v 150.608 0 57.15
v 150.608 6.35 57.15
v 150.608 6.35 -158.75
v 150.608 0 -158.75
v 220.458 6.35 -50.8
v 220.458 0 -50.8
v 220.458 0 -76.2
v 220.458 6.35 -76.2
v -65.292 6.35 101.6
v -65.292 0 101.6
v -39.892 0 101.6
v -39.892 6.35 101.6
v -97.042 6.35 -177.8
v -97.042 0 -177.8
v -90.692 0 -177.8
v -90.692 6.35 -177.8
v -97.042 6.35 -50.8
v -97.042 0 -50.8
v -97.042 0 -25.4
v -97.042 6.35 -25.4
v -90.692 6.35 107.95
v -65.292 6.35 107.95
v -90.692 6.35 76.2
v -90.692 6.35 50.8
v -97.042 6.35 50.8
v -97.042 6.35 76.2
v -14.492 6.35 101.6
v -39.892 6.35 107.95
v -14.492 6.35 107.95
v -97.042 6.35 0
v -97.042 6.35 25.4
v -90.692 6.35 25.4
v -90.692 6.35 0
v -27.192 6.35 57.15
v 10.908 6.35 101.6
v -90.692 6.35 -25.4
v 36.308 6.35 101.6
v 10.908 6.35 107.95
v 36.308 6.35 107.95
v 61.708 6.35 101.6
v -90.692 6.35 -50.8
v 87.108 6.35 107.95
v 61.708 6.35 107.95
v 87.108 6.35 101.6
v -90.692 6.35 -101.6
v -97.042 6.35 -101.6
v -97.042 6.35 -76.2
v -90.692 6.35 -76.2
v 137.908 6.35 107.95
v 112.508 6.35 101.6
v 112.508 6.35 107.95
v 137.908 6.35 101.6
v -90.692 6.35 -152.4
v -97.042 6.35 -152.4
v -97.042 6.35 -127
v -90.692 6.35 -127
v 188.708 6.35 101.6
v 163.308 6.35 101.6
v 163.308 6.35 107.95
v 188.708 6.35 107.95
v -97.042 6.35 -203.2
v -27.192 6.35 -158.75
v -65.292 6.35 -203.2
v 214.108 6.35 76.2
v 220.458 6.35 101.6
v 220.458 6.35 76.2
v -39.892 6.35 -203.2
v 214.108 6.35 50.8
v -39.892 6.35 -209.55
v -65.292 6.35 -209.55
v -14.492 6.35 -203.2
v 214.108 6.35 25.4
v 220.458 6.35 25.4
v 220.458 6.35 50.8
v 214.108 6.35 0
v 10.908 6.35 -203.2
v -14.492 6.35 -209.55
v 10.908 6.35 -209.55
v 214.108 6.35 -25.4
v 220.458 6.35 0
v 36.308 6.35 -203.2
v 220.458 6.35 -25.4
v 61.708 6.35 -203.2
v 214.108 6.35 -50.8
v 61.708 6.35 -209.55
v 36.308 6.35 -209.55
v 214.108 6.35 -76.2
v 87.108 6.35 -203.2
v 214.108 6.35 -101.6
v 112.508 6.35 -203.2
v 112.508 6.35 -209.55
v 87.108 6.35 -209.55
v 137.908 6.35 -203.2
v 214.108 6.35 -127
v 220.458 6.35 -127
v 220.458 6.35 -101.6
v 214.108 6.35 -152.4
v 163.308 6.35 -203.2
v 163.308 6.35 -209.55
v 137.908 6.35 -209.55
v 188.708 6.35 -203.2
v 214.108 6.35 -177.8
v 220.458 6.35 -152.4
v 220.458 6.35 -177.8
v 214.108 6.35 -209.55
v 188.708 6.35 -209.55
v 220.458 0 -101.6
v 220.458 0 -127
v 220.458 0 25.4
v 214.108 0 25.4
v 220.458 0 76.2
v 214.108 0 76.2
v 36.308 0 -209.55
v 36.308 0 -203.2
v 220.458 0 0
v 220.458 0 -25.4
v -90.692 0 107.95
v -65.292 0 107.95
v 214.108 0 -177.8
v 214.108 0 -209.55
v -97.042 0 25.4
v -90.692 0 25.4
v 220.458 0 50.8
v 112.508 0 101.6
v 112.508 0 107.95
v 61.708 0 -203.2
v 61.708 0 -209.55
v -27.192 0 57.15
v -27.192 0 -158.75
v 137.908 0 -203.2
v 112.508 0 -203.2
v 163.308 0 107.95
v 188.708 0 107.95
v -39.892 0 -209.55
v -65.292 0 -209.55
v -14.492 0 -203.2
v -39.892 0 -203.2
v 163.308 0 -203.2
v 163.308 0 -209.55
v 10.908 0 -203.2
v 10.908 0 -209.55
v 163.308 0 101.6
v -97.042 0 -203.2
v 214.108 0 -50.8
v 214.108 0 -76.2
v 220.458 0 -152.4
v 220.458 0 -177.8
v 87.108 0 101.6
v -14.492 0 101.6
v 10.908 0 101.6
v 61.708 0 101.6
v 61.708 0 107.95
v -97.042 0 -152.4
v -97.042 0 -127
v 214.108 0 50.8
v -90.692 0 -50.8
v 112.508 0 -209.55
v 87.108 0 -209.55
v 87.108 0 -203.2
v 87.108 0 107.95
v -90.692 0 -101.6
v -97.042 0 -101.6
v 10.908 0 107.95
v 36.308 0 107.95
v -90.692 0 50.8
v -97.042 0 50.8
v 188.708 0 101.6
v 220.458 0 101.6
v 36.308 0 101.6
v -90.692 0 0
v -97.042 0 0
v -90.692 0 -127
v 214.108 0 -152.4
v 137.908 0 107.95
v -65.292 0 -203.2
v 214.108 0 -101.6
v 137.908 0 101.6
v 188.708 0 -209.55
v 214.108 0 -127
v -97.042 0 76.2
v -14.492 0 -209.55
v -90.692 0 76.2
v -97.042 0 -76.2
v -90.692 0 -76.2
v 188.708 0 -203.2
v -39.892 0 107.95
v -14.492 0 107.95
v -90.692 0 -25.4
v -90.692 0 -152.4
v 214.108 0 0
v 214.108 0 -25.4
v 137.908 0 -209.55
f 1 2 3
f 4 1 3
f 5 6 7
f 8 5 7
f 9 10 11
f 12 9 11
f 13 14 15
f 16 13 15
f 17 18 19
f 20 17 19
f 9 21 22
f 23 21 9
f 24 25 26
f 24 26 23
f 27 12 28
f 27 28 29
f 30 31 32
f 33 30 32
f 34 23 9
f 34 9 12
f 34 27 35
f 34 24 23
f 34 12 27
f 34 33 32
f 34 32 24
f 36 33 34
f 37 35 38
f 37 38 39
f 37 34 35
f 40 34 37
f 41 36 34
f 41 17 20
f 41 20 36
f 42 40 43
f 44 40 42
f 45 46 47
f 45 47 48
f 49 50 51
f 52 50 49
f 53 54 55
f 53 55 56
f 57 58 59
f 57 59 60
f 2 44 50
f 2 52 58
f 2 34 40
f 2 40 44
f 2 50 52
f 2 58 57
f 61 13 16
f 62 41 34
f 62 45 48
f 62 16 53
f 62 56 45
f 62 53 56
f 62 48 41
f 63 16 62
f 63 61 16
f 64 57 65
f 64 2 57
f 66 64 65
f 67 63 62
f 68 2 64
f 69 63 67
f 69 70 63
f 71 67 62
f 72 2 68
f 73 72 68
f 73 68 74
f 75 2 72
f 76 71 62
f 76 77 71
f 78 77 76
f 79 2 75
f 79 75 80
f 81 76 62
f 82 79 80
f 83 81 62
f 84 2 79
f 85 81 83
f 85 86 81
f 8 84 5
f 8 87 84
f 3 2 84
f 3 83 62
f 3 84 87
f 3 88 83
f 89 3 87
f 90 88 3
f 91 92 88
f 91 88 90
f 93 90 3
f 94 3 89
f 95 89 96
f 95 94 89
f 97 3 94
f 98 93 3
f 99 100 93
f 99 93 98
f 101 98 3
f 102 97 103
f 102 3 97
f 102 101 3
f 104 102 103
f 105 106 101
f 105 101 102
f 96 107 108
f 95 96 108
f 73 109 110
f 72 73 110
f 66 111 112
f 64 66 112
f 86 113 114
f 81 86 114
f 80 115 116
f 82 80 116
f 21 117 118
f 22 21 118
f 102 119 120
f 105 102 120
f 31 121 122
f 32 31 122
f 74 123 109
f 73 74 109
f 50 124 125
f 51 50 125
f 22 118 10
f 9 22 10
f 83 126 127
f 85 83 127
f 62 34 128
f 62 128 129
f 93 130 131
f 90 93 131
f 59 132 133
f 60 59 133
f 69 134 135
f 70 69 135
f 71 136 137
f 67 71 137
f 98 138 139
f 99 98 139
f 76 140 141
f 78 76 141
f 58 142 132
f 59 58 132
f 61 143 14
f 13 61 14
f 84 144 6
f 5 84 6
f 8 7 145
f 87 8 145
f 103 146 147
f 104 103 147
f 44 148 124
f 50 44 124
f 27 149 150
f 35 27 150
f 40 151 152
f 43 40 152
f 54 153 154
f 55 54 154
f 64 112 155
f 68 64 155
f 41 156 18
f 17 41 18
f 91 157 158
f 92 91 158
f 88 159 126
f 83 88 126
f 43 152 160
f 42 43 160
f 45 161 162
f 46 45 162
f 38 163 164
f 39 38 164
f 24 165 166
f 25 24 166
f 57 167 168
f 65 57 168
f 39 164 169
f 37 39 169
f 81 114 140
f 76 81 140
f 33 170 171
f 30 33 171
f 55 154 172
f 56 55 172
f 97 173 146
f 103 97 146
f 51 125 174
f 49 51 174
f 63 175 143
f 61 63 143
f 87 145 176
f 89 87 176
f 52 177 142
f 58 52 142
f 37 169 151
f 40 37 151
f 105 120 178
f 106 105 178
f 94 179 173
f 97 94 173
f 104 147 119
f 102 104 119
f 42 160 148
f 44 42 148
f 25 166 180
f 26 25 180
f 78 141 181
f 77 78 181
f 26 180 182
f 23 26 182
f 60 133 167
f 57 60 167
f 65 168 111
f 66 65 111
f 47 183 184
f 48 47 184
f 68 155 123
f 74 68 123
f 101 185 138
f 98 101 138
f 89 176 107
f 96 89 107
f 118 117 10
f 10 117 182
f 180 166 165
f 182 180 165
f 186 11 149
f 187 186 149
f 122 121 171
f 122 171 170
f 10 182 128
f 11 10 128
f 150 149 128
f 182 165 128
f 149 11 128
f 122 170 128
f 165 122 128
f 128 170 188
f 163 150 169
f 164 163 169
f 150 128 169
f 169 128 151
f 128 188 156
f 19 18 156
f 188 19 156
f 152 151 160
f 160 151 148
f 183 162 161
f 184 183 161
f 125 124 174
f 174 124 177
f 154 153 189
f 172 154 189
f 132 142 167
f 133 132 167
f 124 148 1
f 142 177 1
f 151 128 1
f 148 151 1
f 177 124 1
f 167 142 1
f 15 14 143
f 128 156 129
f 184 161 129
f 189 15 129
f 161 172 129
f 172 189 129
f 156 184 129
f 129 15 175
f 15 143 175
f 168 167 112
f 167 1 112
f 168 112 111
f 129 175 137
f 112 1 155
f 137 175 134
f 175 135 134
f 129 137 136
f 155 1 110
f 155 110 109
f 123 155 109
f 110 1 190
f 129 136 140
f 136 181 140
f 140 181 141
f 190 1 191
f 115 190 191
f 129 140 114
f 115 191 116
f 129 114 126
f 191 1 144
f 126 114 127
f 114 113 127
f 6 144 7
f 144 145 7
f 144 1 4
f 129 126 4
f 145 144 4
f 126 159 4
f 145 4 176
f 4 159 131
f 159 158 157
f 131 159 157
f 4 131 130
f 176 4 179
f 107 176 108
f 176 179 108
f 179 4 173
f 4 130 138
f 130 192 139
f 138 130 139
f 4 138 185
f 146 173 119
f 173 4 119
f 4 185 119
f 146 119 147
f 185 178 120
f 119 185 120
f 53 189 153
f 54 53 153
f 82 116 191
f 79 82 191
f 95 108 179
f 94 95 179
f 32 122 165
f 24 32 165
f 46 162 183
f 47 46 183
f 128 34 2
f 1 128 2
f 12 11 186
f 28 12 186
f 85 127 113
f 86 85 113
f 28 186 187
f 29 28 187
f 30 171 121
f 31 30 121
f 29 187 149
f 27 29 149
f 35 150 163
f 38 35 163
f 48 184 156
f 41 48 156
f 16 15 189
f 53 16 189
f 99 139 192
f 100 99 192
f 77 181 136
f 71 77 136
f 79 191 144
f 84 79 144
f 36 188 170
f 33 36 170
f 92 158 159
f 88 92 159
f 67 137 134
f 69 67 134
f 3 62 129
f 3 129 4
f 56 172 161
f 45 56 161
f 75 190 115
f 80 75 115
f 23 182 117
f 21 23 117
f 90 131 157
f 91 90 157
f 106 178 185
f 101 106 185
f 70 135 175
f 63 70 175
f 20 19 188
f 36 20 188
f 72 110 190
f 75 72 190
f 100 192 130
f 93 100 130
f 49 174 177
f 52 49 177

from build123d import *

# Parameters (mm, degrees)
BOSS_EXTRUDE1_DEPTH = 6.35
SKETCH2_W           = 177.8
SKETCH2_H           = 215.9
CUT_EXTRUDE2_DEPTH  = 6.35


with BuildPart() as part:
    # Sketch1 → Boss-Extrude1 (new body)
    with BuildSketch(Plane(origin=(0, 0, 0), x_dir=(1, 0, 0), z_dir=(0, 1, 0))):
        Polygon((-65.292450766, -101.6), (-39.892450766, -101.6), (-39.892450766, -107.95), (-14.492450766, -107.95), (-14.492450766, -101.6), (10.907549234, -101.6), (10.907549234, -107.95), (36.307549234, -107.95), (36.307549234, -101.6), (61.707549234, -101.6), (61.707549234, -107.95), (87.107549234, -107.95), (87.107549234, -101.6), (112.507549234, -101.6), (112.507549234, -107.95), (137.907549234, -107.95), (137.907549234, -101.6), (163.307549234, -101.6), (163.307549234, -107.95), (188.707549234, -107.95), (188.707549234, -101.6), (220.457549234, -101.6), (220.457549234, -76.2), (214.107549234, -76.2), (214.107549234, -50.8), (220.457549234, -50.8), (220.457549234, -25.4), (214.107549234, -25.4), (214.107549234, 0), (220.457549234, 0), (220.457549234, 25.4), (214.107549234, 25.4), (214.107549234, 50.8), (220.457549234, 50.8), (220.457549234, 76.2), (214.107549234, 76.2), (214.107549234, 101.6), (220.457549234, 101.6), (220.457549234, 127), (214.107549234, 127), (214.107549234, 152.4), (220.457549234, 152.4), (220.457549234, 177.8), (214.107549234, 177.8), (214.107549234, 209.55), (188.707549234, 209.55), (188.707549234, 203.2), (163.307549234, 203.2), (163.307549234, 209.55), (137.907549234, 209.55), (137.907549234, 203.2), (112.507549234, 203.2), (112.507549234, 209.55), (87.107549234, 209.55), (87.107549234, 203.2), (61.707549234, 203.2), (61.707549234, 209.55), (36.307549234, 209.55), (36.307549234, 203.2), (10.907549234, 203.2), (10.907549234, 209.55), (-14.492450766, 209.55), (-14.492450766, 203.2), (-39.892450766, 203.2), (-39.892450766, 209.55), (-65.292450766, 209.55), (-65.292450766, 203.2), (-97.042450766, 203.2), (-97.042450766, 177.8), (-90.692450766, 177.8), (-90.692450766, 152.4), (-97.042450766, 152.4), (-97.042450766, 127), (-90.692450766, 127), (-90.692450766, 101.6), (-97.042450766, 101.6), (-97.042450766, 76.2), (-90.692450766, 76.2), (-90.692450766, 50.8), (-97.042450766, 50.8), (-97.042450766, 25.4), (-90.692450766, 25.4), (-90.692450766, 0), (-97.042450766, 0), (-97.042450766, -25.4), (-90.692450766, -25.4), (-90.692450766, -50.8), (-97.042450766, -50.8), (-97.042450766, -76.2), (-90.692450766, -76.2), (-90.692450766, -107.95), (-65.292450766, -107.95), align=None)
    extrude(amount=BOSS_EXTRUDE1_DEPTH)

    # Sketch2 → Cut-Extrude2 (cut)
    with BuildSketch(Plane(origin=(0, 6.35, 0), x_dir=(1, 0, 0), z_dir=(0, 1, 0))):
        with Locations((61.707549234, 50.8)):
            Rectangle(SKETCH2_W, SKETCH2_H)
    extrude(amount=-CUT_EXTRUDE2_DEPTH, mode=Mode.SUBTRACT)


solid = part.part
